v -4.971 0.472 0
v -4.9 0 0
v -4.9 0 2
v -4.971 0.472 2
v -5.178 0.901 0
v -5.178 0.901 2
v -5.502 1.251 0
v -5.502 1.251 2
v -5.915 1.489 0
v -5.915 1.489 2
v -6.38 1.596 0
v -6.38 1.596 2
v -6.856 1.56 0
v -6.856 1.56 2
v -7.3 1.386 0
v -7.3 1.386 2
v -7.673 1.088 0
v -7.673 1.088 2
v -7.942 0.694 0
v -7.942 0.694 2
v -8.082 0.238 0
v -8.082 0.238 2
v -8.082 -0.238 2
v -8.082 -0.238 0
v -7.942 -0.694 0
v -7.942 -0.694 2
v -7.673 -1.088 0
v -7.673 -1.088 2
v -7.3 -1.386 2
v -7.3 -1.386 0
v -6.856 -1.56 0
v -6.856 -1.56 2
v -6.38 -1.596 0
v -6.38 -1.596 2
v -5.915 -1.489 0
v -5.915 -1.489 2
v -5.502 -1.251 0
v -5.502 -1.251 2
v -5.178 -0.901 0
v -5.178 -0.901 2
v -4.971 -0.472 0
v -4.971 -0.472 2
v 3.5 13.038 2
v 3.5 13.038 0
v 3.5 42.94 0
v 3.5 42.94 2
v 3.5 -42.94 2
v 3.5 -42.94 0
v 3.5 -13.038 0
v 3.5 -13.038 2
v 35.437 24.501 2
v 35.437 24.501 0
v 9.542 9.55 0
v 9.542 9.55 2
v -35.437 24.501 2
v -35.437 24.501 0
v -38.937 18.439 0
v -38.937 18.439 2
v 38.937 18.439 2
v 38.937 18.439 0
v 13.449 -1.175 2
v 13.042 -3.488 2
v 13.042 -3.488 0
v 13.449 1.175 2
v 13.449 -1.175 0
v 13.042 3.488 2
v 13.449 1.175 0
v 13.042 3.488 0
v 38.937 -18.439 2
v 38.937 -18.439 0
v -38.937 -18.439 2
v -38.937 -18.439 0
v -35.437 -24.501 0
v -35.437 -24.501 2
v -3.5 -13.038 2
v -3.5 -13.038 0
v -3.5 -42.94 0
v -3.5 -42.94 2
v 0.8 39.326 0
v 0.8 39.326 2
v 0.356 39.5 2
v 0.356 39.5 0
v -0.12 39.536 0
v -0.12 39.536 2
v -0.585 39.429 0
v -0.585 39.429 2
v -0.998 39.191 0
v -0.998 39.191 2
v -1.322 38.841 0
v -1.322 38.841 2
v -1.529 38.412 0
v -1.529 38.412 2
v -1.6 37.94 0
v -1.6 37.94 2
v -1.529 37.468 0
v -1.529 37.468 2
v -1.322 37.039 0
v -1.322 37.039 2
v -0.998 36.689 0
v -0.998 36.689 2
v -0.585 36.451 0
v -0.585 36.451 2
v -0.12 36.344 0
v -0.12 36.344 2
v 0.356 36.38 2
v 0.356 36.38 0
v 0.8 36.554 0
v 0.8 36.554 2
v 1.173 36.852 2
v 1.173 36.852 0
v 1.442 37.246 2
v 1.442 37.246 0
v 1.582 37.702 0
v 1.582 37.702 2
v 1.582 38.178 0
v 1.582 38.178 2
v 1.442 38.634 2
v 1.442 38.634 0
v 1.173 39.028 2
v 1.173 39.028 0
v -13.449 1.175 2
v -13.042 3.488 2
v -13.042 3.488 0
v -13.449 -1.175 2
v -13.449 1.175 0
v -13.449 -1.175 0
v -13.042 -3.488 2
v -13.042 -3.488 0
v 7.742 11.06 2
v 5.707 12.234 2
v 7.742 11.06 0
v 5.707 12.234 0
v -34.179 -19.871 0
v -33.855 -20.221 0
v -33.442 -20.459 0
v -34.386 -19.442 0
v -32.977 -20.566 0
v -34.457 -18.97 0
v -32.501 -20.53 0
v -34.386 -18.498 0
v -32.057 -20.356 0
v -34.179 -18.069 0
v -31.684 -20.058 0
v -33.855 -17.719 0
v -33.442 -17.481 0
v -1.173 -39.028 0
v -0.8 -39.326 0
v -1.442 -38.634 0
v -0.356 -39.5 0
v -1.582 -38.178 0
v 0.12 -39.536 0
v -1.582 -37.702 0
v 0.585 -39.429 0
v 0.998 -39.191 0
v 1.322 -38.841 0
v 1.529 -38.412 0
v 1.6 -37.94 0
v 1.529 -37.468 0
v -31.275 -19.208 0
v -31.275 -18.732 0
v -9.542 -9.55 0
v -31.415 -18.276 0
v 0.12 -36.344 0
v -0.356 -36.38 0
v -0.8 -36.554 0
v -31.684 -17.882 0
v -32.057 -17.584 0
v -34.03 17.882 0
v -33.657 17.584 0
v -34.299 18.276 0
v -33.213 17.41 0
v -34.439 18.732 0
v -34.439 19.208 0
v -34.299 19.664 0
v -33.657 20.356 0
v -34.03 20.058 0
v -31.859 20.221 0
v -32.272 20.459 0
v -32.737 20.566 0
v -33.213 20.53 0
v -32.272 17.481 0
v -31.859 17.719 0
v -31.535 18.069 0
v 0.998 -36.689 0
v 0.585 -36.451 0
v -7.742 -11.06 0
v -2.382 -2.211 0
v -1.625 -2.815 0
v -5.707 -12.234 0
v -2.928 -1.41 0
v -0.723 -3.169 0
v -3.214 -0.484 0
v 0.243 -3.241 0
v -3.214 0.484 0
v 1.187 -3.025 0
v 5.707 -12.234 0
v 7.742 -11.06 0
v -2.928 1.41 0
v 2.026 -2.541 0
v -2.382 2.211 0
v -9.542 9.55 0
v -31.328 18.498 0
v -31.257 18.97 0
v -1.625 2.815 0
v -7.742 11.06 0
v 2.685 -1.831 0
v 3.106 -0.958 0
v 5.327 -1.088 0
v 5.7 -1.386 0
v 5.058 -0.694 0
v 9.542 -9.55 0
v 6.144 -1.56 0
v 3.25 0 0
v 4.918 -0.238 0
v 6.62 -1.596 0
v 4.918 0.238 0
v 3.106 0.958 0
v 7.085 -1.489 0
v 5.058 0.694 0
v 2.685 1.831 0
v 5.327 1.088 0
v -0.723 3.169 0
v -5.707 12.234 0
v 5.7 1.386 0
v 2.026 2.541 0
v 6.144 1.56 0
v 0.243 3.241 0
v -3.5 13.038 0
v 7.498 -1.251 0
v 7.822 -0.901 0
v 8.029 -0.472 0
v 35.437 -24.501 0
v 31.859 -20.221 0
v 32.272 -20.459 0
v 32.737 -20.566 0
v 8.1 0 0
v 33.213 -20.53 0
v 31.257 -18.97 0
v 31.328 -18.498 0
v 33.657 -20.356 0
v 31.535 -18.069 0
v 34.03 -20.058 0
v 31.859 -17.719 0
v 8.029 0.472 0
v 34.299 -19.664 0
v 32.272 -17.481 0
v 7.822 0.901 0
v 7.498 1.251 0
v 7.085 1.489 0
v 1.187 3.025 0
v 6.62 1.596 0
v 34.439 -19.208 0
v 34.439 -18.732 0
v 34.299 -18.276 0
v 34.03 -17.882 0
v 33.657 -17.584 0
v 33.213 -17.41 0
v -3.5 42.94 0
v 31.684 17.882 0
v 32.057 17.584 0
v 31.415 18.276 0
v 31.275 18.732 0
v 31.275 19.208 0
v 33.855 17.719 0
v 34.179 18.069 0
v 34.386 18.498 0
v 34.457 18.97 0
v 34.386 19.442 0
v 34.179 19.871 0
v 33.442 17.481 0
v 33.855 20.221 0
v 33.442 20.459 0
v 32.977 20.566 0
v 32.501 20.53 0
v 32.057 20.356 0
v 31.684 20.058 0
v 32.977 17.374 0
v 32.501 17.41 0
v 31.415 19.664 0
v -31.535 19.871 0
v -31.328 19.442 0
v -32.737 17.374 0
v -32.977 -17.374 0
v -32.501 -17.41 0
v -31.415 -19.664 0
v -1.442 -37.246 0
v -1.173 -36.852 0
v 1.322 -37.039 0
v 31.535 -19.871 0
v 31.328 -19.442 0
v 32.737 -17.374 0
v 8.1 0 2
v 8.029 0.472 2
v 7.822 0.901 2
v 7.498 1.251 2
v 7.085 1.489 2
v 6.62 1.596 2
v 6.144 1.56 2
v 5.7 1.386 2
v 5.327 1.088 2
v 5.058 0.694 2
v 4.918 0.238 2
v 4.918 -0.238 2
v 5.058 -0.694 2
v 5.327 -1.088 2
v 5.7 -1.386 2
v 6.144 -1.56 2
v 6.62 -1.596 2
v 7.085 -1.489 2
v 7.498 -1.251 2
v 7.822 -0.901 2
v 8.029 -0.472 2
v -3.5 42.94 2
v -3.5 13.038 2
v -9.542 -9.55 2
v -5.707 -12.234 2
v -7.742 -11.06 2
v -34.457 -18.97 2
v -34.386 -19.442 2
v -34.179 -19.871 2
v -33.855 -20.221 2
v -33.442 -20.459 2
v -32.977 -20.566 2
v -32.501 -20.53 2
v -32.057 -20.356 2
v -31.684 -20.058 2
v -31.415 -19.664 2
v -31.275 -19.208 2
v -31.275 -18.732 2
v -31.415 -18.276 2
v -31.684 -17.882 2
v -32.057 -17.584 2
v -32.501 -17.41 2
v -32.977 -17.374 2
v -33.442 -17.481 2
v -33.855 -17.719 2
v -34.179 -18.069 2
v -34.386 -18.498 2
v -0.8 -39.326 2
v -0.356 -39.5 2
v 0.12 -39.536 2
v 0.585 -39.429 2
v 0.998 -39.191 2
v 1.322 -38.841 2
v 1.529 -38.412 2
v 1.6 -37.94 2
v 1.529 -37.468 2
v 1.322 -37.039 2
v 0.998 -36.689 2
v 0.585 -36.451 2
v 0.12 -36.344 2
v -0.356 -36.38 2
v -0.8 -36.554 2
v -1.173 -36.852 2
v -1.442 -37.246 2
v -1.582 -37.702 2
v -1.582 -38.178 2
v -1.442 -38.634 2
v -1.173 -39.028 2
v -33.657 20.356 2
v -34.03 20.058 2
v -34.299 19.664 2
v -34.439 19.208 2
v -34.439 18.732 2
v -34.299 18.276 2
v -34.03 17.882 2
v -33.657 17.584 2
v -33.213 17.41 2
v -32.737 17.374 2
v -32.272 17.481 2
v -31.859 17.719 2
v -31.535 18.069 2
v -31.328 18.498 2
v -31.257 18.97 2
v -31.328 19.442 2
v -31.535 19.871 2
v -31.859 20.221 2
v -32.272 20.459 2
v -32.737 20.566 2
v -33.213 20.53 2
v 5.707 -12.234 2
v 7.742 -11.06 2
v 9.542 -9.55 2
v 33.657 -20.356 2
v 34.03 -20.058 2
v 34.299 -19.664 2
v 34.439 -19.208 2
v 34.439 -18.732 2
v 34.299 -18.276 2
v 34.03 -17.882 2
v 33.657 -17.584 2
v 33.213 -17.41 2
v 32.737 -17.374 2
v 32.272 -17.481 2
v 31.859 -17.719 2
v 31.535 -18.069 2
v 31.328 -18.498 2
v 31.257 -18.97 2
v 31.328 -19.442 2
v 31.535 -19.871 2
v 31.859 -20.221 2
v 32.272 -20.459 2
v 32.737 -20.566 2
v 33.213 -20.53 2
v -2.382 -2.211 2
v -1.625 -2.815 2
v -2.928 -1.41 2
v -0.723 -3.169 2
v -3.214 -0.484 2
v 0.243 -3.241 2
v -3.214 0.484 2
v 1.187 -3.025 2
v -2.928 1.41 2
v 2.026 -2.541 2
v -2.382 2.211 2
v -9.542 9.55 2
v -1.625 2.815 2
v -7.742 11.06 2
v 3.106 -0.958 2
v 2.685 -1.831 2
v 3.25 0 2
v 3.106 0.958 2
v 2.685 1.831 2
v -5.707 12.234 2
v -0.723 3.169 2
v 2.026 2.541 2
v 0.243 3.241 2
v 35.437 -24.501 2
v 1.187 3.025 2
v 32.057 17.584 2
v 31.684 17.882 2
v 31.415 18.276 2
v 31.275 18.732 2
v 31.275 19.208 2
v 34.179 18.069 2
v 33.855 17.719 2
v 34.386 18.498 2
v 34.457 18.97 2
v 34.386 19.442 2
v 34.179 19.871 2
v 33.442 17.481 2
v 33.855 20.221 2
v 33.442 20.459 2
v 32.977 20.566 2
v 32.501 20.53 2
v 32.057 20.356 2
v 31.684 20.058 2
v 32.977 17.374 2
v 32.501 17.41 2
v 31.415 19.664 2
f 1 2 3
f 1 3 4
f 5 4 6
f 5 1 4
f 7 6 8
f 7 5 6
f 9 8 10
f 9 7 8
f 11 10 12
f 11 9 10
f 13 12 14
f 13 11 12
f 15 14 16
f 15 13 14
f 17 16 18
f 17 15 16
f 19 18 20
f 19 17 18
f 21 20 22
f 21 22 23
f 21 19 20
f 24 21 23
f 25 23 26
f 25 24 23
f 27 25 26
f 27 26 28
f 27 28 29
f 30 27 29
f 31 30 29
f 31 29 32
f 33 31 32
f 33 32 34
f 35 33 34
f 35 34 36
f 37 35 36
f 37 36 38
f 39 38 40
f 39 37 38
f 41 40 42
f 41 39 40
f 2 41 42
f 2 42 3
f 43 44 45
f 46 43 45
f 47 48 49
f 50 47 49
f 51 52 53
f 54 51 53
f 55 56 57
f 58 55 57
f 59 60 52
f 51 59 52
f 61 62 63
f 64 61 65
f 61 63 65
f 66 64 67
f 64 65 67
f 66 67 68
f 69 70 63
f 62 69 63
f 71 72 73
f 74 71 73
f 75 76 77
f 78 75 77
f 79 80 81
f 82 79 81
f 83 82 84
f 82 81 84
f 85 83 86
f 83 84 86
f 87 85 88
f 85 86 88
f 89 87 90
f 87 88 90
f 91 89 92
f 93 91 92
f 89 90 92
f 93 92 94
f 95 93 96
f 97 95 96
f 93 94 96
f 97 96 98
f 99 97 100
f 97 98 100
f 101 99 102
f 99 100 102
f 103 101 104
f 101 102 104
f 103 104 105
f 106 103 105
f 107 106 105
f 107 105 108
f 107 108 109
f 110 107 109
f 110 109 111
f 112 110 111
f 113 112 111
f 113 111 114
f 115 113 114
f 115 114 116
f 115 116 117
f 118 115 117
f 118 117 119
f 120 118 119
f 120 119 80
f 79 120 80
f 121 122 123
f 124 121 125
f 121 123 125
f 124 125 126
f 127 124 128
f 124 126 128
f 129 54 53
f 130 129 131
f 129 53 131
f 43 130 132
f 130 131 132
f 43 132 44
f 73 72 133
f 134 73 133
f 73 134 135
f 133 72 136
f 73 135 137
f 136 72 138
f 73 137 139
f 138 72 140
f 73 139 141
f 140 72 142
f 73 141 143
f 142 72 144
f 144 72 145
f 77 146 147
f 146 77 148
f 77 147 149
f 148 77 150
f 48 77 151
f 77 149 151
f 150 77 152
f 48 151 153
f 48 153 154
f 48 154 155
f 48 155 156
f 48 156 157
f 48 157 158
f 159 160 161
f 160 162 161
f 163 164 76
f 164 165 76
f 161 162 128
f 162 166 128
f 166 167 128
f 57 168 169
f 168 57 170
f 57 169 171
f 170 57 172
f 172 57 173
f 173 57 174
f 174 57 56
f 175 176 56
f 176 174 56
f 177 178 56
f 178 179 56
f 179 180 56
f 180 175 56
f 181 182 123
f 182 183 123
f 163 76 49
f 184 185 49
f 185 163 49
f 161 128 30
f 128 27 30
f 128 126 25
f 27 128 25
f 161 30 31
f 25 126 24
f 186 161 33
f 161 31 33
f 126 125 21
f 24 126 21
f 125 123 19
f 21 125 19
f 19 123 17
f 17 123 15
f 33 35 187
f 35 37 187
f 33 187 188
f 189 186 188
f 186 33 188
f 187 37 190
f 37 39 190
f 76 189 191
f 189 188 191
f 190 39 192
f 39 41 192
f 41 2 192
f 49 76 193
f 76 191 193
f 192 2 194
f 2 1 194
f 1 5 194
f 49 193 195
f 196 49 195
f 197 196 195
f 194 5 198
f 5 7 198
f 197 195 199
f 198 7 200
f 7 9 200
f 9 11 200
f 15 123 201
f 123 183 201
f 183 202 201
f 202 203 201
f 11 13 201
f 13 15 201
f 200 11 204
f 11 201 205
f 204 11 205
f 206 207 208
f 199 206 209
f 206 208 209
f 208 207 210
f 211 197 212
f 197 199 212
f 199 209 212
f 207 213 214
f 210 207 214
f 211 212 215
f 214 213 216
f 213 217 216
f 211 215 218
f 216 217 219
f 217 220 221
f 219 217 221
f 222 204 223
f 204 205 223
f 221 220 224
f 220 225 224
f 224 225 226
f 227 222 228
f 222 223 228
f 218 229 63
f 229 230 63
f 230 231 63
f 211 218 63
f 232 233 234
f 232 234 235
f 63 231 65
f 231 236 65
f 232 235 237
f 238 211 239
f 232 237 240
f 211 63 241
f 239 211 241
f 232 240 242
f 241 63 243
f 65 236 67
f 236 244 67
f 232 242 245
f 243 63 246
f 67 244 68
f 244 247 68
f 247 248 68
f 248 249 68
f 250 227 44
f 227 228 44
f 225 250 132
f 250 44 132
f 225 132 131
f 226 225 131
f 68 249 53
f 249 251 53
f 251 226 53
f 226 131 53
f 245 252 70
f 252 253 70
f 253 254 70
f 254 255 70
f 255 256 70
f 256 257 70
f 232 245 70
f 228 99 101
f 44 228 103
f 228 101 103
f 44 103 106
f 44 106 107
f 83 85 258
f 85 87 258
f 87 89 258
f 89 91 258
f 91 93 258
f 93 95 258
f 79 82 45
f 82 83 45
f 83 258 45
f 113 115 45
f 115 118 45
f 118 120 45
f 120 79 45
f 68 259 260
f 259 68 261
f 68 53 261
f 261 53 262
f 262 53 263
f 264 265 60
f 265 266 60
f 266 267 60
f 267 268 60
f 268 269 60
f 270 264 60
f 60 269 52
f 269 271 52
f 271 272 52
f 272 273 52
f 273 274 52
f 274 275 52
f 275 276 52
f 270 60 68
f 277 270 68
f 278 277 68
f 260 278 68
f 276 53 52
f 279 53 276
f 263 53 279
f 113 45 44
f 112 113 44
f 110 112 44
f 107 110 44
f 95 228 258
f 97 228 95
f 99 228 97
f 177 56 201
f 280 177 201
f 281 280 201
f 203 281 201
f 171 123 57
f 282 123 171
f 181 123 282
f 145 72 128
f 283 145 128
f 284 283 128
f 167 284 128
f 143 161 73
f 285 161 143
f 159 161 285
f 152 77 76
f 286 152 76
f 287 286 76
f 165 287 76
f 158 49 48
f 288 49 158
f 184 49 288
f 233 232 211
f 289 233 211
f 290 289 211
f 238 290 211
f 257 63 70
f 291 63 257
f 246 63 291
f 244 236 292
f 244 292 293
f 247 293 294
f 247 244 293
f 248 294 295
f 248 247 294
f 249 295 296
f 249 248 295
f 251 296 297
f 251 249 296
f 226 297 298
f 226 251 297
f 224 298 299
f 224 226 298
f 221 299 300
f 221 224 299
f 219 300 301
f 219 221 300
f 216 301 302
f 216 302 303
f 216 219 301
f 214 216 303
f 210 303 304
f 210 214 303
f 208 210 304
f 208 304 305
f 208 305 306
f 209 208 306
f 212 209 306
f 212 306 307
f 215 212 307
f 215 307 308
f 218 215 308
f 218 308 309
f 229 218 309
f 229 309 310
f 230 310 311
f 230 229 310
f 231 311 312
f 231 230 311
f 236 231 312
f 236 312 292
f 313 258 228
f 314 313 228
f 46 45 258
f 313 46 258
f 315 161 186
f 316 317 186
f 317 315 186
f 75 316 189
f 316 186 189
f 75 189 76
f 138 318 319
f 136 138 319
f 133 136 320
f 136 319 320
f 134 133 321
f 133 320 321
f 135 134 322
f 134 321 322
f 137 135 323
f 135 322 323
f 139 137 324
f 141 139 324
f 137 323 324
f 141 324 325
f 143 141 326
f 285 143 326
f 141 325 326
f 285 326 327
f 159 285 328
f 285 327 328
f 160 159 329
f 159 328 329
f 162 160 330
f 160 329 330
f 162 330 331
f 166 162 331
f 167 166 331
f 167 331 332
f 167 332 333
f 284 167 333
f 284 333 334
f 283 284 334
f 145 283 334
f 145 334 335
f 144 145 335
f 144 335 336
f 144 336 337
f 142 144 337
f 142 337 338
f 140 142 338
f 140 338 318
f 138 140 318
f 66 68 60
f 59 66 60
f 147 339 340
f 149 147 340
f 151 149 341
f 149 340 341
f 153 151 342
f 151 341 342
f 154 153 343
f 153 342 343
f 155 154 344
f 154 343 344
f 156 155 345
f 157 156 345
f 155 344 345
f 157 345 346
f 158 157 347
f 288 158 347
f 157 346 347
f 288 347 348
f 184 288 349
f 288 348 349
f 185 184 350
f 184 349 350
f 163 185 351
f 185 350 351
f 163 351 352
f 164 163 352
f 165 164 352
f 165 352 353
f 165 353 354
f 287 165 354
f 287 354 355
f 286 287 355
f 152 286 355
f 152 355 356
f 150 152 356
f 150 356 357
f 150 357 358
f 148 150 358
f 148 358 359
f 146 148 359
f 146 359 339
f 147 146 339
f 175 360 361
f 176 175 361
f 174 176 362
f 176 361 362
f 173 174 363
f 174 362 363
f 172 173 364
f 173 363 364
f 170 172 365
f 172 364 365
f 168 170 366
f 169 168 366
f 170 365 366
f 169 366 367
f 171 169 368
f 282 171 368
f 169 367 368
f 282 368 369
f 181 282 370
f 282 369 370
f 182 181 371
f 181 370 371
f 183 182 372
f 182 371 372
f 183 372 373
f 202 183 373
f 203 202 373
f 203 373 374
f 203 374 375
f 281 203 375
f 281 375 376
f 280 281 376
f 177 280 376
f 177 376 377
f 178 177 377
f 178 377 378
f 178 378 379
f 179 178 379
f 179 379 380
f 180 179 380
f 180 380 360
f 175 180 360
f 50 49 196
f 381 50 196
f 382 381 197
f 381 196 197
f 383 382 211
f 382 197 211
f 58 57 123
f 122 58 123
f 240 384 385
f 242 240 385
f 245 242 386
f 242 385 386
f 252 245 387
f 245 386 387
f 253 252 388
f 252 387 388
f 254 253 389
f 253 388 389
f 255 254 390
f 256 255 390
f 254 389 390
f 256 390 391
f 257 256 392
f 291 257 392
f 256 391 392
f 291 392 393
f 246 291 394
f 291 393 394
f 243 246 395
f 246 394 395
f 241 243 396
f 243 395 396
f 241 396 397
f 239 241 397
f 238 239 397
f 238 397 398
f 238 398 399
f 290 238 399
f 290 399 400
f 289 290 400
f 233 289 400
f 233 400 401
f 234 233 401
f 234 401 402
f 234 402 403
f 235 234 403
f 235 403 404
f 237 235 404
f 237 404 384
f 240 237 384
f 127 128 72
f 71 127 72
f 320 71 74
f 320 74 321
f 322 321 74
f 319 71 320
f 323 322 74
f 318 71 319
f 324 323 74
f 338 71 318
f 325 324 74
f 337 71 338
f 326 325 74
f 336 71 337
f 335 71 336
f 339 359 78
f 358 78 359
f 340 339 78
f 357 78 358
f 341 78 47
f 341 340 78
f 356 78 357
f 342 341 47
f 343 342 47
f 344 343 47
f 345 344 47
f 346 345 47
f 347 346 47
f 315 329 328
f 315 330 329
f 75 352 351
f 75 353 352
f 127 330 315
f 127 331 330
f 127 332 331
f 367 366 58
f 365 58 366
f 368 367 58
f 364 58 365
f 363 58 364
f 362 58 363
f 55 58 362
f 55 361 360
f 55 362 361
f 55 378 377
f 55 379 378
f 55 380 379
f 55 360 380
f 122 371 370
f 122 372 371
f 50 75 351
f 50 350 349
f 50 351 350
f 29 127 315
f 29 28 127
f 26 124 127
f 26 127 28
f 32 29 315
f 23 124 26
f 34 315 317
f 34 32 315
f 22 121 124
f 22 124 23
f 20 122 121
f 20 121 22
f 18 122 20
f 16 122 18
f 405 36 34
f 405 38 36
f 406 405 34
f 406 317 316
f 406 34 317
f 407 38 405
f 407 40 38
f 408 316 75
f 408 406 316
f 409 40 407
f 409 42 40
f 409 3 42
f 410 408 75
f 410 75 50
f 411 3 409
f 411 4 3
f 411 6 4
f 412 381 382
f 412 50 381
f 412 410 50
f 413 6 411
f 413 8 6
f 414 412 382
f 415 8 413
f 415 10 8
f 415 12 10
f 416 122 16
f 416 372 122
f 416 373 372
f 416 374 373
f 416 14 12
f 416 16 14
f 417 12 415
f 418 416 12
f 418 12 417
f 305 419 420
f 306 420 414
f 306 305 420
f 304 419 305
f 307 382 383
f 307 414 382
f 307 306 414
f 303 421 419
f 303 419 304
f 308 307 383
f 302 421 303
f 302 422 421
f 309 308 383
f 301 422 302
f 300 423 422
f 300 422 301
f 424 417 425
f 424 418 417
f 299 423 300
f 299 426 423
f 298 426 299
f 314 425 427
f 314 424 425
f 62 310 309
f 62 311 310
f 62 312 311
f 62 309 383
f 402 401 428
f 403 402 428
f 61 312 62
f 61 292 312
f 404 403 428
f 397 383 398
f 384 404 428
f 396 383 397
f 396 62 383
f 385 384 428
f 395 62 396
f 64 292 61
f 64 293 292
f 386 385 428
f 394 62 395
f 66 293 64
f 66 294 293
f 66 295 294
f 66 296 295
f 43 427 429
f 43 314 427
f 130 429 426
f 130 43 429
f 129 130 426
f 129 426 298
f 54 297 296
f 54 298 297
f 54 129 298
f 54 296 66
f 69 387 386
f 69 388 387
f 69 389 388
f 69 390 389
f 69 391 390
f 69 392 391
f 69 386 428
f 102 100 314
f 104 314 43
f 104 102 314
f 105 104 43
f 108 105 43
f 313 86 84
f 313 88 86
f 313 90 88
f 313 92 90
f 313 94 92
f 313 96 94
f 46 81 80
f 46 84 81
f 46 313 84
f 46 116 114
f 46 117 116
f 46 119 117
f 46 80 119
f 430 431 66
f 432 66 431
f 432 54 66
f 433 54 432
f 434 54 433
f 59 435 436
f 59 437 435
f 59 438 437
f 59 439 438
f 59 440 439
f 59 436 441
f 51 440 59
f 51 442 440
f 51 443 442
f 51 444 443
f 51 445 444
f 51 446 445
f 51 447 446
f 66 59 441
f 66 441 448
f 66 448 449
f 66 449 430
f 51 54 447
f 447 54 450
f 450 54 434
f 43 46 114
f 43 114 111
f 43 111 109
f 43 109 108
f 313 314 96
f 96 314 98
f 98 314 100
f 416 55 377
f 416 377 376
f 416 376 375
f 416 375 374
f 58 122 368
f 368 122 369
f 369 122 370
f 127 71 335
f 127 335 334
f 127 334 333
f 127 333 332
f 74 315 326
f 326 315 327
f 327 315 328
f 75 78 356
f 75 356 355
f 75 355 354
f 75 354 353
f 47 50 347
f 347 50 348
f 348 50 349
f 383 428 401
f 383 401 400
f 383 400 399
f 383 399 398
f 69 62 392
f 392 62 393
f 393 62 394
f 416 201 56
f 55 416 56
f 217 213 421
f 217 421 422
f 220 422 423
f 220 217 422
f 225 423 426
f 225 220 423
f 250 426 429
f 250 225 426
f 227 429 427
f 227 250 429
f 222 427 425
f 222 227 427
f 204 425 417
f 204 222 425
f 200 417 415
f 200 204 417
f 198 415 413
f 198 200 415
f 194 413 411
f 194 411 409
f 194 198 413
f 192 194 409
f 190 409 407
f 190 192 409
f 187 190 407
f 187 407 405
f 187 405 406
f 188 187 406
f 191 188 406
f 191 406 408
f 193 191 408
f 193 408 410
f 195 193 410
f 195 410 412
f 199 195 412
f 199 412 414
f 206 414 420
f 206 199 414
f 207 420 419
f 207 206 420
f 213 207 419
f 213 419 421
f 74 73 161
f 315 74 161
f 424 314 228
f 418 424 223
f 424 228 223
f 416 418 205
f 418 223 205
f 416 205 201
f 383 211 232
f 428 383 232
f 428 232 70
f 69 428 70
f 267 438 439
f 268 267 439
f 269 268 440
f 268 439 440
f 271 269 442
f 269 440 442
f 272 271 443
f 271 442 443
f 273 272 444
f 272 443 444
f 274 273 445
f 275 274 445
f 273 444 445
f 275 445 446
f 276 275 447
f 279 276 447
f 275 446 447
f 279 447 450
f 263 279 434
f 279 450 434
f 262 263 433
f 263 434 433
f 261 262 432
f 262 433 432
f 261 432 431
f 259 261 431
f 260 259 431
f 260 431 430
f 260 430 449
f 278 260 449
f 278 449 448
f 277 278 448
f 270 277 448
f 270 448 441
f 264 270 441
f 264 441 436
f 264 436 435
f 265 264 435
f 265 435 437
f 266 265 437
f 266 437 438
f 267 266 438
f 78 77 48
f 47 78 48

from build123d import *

# Parameters (mm, degrees)
SKETCH_1_R               = 13.5
SKETCH_1_R_2             = 3.25
SKETCH_1_R_3             = 1.6
EXTRUDE_3_DEPTH          = 2
EXTRUDE_4_DEPTH          = 2
PATTERN_CIRCULAR_1_COUNT = 6
CUT_EXTRUDE_1_REACH      = 60
SKETCH_2_R               = 1.6
PATTERN_CIRCULAR_2_COUNT = 6


with BuildPart() as part:
    # ｽｹｯﾁ1 → ﾎﾞｽ - 押し出し3 (new body)
    with BuildSketch(Plane.XY):
        Circle(SKETCH_1_R)
        Circle(SKETCH_1_R_2, mode=Mode.SUBTRACT)
        with Locations((6.5, 0)):
            Circle(SKETCH_1_R_3, mode=Mode.SUBTRACT)
        with Locations((-6.5, 0)):
            Circle(SKETCH_1_R_3, mode=Mode.SUBTRACT)
    extrude(amount=EXTRUDE_3_DEPTH)

    # ｽｹｯﾁ1<7> → ﾎﾞｽ - 押し出し4 (add)
    with BuildSketch(Plane.XY):
        with BuildLine():
            ThreePointArc((9.541589791, 9.550291318), (11.691342951, 6.75), (13.041589791, 3.488113492))
            Line((13.041589791, 3.488113492), (38.937130839, 18.438911087))
            Line((38.937130839, 18.438911087), (35.437130839, 24.501088913))
            Line((35.437130839, 24.501088913), (9.541589791, 9.550291318))
        make_face()
    extrude_4 = extrude(amount=EXTRUDE_4_DEPTH)

    # 円形ﾊﾟﾀｰﾝ1: ﾎﾞｽ - 押し出し4 ×6 about axis
    pattern_circular_1_axis = Axis((0, 0, 2), (0, 0, 1))
    for i in range(1, PATTERN_CIRCULAR_1_COUNT):
        add(extrude_4.rotate(pattern_circular_1_axis, i * 360 / PATTERN_CIRCULAR_1_COUNT))

    # ｽｹｯﾁ2 → ｶｯﾄ - 押し出し1 (cut, up to next)
    with BuildSketch(Plane.XY.offset(2), mode=Mode.PRIVATE) as cut_extrude_1_sk1:
        with Locations((32.85700382, 18.97)):
            Circle(SKETCH_2_R)
    cut_extrude_1_tool1 = extrude(cut_extrude_1_sk1.sketch, amount=-CUT_EXTRUDE_1_REACH, mode=Mode.PRIVATE) & part.part
    cut_extrude_1 = cut_extrude_1_tool1.solids().sort_by_distance((32.857004, 18.97, 2))[0]
    add(cut_extrude_1, mode=Mode.SUBTRACT)

    # 円形ﾊﾟﾀｰﾝ2: ｶｯﾄ - 押し出し1 ×6 about axis
    pattern_circular_2_axis = Axis((0, 0, 2), (0, 0, 1))
    for i in range(1, PATTERN_CIRCULAR_2_COUNT):
        add(cut_extrude_1.rotate(pattern_circular_2_axis, i * 360 / PATTERN_CIRCULAR_2_COUNT), mode=Mode.SUBTRACT)


solid = part.part
